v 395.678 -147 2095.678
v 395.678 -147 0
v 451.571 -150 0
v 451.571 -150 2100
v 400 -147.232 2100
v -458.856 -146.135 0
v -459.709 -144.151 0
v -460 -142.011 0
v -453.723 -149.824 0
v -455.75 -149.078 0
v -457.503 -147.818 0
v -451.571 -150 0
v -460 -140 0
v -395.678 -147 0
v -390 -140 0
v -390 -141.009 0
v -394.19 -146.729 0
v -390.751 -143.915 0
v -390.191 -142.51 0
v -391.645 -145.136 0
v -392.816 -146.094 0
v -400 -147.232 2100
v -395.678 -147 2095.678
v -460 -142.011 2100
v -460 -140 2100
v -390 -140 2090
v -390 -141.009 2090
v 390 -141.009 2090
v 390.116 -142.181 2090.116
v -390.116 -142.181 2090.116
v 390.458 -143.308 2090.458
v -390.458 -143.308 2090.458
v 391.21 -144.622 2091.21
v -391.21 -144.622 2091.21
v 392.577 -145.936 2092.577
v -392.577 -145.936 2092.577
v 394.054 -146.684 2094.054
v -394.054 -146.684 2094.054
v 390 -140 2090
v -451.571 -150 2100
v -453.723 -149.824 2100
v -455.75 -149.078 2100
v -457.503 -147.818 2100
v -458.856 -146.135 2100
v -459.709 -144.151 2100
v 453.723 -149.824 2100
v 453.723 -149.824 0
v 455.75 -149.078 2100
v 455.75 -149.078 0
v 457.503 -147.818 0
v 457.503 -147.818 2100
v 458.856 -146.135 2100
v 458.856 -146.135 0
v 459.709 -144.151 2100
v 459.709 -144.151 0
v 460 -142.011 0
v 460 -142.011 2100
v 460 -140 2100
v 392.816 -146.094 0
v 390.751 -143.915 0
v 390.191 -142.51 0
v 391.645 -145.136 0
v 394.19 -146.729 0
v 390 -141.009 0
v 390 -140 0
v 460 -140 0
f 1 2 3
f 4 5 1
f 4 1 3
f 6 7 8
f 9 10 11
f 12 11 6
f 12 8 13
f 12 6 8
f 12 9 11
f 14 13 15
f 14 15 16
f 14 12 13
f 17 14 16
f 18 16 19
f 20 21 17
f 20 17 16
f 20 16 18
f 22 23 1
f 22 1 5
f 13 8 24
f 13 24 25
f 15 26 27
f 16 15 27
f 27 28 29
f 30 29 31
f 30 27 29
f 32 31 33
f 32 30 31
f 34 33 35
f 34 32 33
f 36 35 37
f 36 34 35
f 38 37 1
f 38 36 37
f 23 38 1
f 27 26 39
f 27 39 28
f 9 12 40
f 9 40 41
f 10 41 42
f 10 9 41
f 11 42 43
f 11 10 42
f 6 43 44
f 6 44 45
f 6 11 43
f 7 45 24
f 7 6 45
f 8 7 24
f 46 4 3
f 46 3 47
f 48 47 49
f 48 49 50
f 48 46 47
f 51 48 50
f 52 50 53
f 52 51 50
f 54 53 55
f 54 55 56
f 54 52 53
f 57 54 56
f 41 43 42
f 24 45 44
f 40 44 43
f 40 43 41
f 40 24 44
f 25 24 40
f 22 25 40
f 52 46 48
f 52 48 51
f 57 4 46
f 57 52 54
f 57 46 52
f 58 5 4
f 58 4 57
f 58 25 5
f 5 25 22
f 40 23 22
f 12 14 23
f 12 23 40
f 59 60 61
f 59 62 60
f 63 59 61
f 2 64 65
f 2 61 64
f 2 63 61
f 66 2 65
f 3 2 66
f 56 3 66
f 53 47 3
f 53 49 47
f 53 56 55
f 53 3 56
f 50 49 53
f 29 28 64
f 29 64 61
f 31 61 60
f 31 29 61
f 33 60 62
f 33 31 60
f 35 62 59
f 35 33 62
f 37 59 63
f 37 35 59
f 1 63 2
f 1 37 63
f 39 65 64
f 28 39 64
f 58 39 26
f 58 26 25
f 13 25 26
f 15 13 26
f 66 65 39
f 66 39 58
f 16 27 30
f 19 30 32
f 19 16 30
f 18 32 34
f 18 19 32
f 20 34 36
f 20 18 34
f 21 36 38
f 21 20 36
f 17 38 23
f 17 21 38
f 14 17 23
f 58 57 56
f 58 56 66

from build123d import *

# Parameters (mm, degrees)
SKETCH278_W         = 1600
SKETCH278_H         = 400
EXTRUDE039512_DEPTH = 500


with BuildPart() as extrude039512:
    # Sketch278 (on Sketch) → Extrude039512 (new body, symmetric)
    with BuildSketch(Plane.XZ):
        with Locations((0, 2300)):
            Rectangle(SKETCH278_W, SKETCH278_H)
        with Locations((0, -200)):
            Rectangle(SKETCH278_W, SKETCH278_H)
    extrude(amount=EXTRUDE039512_DEPTH, both=True)


with BuildPart() as trim_two_parts_external:
    # Sweep011: sweep along a path in Sketch194
    with BuildLine(Plane.XZ.offset(140)) as sweep011_path:
        Line((-390, 2090), (-390, 0))
        Line((-390, 0), (390, 0))
        Line((390, 0), (390, 2090))
        Line((390, 2090), (-390, 2090))
    # Clone2D027 (on Sketch) → Sweep011 (sweep)
    with BuildSketch(Plane(origin=(0, -140, 0), x_dir=(0, 0, 1), z_dir=(1, 0, 0))):
        with BuildLine():
            Line((-61.571224, 10), (-5.678418, 7))
            ThreePointArc((-5.678418, 7), (-1.645147, 5.136003), (0, 1.008624))
            Line((0, 1.008624), (0, 0))
            Line((0, 0), (-70, 0))
            Line((-70, 0), (-70, 2.011499))
            ThreePointArc((-70, 2.011499), (-67.503171, 7.81797), (-61.571224, 10))
        make_face()
    sweep(path=sweep011_path.line, is_frenet=True, transition=Transition.RIGHT)

    # Cut077: cut Extrude039512
    add(extrude039512.part, mode=Mode.SUBTRACT)


solid = trim_two_parts_external.part
